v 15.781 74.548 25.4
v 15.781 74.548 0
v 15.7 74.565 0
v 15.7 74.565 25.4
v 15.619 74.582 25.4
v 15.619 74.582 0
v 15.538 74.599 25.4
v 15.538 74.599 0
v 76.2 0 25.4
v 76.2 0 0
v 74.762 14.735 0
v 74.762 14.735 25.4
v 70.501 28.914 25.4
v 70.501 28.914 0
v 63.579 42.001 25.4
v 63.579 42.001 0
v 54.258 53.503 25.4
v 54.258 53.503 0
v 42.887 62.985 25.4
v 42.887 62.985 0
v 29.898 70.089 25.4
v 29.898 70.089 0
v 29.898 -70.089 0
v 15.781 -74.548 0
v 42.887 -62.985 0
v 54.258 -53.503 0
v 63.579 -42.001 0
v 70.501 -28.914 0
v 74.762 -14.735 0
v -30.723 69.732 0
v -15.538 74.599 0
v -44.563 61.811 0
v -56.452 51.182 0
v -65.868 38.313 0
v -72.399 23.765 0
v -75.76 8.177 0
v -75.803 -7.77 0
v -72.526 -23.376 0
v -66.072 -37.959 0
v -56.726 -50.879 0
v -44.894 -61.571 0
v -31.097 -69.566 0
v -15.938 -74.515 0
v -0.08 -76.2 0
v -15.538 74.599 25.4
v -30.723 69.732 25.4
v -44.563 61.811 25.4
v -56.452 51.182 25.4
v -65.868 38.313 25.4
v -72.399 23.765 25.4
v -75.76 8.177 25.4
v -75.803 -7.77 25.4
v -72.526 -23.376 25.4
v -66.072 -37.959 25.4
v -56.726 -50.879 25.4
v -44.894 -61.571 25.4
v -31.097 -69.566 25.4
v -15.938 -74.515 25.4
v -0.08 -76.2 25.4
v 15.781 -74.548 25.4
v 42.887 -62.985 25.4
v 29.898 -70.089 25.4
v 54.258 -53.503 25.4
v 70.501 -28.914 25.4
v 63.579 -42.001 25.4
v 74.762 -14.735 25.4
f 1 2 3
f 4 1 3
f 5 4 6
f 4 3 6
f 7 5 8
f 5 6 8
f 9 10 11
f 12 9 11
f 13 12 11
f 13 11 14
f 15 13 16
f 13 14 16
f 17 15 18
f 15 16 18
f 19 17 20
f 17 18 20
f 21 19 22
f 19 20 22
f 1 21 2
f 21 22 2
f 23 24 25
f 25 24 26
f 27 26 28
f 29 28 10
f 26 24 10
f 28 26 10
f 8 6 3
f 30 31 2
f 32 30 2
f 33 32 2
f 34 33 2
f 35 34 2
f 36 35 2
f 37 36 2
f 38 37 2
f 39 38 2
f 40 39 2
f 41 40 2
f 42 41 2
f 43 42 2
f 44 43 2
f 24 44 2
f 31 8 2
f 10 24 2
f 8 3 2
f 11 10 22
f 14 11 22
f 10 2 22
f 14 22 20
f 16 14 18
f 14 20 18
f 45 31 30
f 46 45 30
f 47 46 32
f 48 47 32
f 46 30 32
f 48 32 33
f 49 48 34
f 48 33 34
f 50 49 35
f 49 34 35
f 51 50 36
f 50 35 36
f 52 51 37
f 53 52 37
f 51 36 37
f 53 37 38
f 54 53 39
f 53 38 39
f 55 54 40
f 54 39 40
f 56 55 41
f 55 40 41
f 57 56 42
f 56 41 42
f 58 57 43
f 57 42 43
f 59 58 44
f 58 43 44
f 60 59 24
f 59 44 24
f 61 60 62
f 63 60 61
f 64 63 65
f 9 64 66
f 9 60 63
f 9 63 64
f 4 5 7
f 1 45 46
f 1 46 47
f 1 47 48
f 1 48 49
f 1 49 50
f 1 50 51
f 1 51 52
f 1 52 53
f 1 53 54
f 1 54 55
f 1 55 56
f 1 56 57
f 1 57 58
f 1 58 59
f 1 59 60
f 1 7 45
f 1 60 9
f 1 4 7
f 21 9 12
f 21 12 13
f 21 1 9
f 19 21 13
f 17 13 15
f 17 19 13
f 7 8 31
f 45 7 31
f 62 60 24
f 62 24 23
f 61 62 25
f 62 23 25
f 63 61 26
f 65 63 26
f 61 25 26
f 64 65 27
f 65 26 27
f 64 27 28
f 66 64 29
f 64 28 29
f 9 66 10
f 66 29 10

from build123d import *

# Parameters (mm, degrees)
F1_DEPTH = 25.4


with BuildPart() as f1:
    # F0 (on Top) → F1 (new body)
    with BuildSketch(Plane.XY):
        with BuildLine():
            Line((-15.537605658, -74.5480572665), (-15.537605658, 74.5990804931))
            ThreePointArc((-15.537605658, 74.5990804931), (-74.5736678483, -15.6591207816), (15.780594342, -74.5480572665))
            Line((15.780594342, -74.5480572665), (-15.537605658, -74.5480572665))
        make_face()
        with BuildLine():
            Line((15.537605658, 74.5990804931), (-15.537605658, 74.5990804931))
            Line((-15.537605658, 74.5990804931), (-15.537605658, -74.5480572665))
            Line((-15.537605658, -74.5480572665), (15.780594342, -74.5480572665))
            Line((15.780594342, -74.5480572665), (15.780594342, 74.5480572665))
            ThreePointArc((15.780594342, 74.5480572665), (15.6591207816, 74.5736678483), (15.537605658, 74.5990804931))
        make_face()
        with BuildLine():
            Line((15.780594342, 74.5480572665), (15.780594342, -74.5480572665))
            ThreePointArc((15.780594342, -74.5480572665), (59.1984851532, -47.9789470036), (76.2, 0))
            ThreePointArc((76.2, 0), (59.1984851532, 47.9789470036), (15.780594342, 74.5480572665))
        make_face()
    extrude(amount=F1_DEPTH)


solid = f1.part
